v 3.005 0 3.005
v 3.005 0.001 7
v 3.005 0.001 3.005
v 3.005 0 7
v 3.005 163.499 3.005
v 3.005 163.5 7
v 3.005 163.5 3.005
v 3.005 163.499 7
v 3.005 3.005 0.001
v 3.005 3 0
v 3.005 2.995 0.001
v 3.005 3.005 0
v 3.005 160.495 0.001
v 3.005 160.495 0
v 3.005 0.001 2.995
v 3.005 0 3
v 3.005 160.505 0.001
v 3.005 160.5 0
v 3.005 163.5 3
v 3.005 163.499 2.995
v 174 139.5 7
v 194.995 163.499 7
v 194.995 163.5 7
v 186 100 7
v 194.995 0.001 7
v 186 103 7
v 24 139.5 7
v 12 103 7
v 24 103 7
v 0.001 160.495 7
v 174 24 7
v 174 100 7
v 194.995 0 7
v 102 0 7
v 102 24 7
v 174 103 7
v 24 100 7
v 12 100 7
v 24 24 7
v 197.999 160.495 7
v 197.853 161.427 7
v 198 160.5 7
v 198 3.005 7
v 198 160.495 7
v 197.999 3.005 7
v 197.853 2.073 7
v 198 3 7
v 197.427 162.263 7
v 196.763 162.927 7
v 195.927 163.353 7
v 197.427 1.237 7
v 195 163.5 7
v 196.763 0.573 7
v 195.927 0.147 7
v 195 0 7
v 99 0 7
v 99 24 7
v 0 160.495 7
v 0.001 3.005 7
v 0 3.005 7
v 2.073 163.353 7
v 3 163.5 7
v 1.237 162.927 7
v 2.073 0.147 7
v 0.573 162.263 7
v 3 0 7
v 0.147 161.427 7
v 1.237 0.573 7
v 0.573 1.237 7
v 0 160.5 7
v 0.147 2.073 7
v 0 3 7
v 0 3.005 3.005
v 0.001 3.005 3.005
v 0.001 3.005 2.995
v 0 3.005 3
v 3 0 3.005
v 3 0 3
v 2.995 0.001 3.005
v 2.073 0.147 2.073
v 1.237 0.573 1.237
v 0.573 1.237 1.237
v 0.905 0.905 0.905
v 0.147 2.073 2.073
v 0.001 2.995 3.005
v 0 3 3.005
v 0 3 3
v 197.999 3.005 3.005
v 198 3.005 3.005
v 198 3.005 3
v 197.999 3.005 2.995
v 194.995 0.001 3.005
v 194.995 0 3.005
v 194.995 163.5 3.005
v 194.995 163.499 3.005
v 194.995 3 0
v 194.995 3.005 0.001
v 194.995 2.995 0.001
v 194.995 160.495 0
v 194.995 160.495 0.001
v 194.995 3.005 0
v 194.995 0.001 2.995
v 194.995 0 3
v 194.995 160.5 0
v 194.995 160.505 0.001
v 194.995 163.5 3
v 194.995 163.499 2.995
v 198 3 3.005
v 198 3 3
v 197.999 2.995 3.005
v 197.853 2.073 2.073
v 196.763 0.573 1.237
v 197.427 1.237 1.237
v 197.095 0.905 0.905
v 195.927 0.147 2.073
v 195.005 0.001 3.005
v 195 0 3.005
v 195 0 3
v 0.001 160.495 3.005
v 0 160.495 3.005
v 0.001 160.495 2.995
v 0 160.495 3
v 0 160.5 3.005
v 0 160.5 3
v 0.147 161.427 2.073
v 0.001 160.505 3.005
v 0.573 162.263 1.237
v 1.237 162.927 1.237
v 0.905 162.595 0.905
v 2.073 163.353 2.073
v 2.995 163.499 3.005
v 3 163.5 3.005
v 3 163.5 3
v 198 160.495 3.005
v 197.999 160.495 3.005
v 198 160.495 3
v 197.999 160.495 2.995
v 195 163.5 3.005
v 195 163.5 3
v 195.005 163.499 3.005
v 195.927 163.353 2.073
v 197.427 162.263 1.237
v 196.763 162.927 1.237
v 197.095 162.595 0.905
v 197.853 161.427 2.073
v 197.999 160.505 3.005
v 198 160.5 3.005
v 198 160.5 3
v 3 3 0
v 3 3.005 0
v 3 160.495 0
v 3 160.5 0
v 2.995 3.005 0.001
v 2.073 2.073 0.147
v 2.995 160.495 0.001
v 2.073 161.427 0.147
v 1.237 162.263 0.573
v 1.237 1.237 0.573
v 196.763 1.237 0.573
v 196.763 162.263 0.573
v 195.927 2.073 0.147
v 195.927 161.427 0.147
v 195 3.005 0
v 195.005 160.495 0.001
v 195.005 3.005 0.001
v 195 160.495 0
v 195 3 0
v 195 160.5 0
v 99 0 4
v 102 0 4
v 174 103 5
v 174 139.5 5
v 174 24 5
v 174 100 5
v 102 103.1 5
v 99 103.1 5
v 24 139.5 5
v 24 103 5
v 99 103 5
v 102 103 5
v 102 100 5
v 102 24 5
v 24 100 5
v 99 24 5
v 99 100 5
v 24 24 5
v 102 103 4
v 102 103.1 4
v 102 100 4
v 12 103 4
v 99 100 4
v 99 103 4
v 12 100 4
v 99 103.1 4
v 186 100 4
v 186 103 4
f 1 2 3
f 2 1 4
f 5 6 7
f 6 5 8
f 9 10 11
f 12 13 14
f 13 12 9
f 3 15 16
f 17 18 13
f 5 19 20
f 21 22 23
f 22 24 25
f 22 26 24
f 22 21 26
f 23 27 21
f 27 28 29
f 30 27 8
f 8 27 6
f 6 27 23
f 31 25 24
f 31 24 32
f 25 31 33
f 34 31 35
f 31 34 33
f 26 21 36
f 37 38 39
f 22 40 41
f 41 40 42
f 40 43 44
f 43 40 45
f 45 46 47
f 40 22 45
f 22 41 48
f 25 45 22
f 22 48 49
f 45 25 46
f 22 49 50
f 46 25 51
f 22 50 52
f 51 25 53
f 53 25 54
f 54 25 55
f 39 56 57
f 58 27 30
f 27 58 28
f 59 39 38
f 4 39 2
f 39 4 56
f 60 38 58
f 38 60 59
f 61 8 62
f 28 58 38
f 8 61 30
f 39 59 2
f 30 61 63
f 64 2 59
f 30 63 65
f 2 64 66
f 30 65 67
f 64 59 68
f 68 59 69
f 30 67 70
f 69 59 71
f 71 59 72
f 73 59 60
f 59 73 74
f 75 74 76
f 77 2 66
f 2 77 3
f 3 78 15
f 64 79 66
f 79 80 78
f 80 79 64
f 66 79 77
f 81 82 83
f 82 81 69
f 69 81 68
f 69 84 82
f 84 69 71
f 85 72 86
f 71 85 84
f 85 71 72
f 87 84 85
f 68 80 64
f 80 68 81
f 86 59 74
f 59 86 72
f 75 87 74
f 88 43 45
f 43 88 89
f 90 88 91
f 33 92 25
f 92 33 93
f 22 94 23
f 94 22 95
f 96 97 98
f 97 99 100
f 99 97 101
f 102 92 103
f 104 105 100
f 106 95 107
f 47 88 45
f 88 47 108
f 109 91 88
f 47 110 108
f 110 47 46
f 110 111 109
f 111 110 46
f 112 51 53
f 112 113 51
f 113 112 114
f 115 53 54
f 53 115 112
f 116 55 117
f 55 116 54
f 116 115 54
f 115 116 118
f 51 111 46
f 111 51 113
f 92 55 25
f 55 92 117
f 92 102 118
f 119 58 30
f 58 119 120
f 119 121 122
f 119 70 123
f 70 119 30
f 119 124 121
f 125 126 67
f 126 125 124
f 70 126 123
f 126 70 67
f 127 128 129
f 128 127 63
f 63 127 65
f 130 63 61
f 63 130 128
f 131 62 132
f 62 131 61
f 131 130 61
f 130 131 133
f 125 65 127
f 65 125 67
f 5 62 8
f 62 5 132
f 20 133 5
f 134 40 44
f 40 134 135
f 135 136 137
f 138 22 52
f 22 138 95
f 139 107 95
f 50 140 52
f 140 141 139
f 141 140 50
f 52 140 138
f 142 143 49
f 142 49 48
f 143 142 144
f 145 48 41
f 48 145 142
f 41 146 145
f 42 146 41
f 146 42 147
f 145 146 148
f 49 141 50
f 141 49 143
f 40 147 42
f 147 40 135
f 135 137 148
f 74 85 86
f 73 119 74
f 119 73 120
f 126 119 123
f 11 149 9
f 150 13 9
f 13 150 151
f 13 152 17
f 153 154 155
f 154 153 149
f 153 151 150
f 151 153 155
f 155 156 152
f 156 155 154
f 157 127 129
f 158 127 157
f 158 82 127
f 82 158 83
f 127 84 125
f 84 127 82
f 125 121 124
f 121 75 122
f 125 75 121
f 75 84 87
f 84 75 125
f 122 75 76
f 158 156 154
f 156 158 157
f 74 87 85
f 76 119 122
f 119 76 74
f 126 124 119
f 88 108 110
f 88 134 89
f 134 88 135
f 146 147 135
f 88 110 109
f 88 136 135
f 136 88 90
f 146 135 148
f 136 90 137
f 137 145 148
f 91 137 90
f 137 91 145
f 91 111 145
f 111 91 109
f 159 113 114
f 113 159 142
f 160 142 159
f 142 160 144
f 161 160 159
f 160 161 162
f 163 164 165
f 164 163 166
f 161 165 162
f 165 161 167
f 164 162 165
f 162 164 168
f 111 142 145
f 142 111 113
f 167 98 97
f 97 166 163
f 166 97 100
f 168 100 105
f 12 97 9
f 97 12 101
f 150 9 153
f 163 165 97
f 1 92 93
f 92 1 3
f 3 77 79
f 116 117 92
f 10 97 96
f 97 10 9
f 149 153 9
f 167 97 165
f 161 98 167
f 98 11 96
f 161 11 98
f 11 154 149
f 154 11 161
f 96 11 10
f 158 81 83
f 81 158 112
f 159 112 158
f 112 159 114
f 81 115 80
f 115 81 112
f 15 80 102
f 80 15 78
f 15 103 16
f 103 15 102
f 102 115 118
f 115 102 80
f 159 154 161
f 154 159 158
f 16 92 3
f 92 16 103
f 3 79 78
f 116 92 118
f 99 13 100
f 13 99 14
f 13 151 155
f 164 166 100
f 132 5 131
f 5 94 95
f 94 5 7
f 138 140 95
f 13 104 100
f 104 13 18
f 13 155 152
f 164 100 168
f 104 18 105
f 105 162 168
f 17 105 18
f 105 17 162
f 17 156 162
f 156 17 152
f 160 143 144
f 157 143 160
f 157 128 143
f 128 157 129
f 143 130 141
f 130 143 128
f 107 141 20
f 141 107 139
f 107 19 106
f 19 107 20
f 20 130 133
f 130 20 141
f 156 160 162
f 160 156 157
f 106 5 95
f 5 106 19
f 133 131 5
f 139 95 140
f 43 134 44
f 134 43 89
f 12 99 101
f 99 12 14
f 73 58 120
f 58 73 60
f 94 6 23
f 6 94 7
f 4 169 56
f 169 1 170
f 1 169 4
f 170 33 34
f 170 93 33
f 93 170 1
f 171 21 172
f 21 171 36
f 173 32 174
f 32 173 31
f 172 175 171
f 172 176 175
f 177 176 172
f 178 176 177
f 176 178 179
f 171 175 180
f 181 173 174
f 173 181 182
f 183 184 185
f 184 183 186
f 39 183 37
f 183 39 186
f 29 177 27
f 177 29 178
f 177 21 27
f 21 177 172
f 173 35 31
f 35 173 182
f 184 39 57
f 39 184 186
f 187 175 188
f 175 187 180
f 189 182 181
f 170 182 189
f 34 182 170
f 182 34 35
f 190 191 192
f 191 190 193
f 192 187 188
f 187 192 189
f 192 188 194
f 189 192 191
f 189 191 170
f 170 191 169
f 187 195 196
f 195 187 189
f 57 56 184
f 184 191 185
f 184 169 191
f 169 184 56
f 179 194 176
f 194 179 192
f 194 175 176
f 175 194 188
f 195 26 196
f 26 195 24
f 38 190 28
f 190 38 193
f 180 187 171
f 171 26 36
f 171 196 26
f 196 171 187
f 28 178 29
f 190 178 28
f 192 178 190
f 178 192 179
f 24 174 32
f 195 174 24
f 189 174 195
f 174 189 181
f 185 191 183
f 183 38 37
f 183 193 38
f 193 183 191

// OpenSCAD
hole_size = 3;
side_wall = 24.0;
bottom_wall = 5;
touch_width = 150.0;
touch_length = 115.5;
touch_depth = 2.0;
button_position = 100.0;
wire_cut_depth = 3.0;
wire_cut_width = 3.0;
side_fillet_radius = 3.0;
bottom_fillet_radius = 3.0;

// Set the angular resolution ($fn segments per 360 deg)
$fn = 20;

box_height = bottom_wall + touch_depth;
box_width = touch_width+side_wall*2;
box_length = touch_length+side_wall*2;

module fillet(r, h) {
    translate([r / 2, r / 2, 0])
    difference() {
        cube([r + 0.01, r + 0.01, h], center = true);
        translate([r/2, r/2, 0])
          cylinder(r = r, h = h + 1, center = true);
    }
}

difference(){
    // Main box
    cube([box_width, box_length, box_height]);

    // cut-out the touch screen cavity
    //translate([side_wall+lip_width, side_wall+lip_width, bottom_wall])
    //  cube([trans_width-lip_width*2, trans_length-lip_width*2, box_height]);

    // cut for the touch screen
    translate([side_wall, side_wall, box_height-touch_depth])
      cube([touch_width, touch_length, touch_depth+0.1]);

    // outside cut for wires
    translate([box_width/2, 0, box_height-wire_cut_depth])
      cube([wire_cut_width, button_position+wire_cut_width+.1, wire_cut_depth*2]);

    // inside cut for wires
    translate([side_wall/2, button_position, box_height-wire_cut_depth])
      cube([box_width-side_wall, wire_cut_width, wire_cut_depth*2]);

    // holes
//    for (x=[-1,0,1], y=[-1,0,1] ){
//        translate([x*hole_size*2+box_width/2, y*hole_size*2+box_length/2+trans_base/2, -0.1])
//          cylinder(r=hole_size/2, h=box_height);
//    }

    // fillets for the side edges
    fillet(side_fillet_radius, box_height*2);
    translate([box_width,0,0])
      rotate(a=[0,0,90])
        fillet(side_fillet_radius, box_height*2);
    translate([0,box_length,0])
      rotate(a=[0,0,270])
        fillet(side_fillet_radius, box_height*2);
    translate([box_width,box_length,0])
      rotate(a=[0,0,180])
        fillet(side_fillet_radius, box_height*2);

    // fillets for the two bottom length-wise edges
    rotate(a=[90,0,0])
      fillet(bottom_fillet_radius, box_length*2+.1);
    translate([box_width,0,0])
      rotate(a=[90,-90,0])
        fillet(bottom_fillet_radius, box_length*2+.1);
    // fillets for the two bottom width-wise edges
    rotate(a=[90,0,90])
      fillet(bottom_fillet_radius, box_width*2+.1);
    translate([0,box_length,0])
      rotate(a=[90,0,-90])
        fillet(bottom_fillet_radius, box_width*2+.1);
}
